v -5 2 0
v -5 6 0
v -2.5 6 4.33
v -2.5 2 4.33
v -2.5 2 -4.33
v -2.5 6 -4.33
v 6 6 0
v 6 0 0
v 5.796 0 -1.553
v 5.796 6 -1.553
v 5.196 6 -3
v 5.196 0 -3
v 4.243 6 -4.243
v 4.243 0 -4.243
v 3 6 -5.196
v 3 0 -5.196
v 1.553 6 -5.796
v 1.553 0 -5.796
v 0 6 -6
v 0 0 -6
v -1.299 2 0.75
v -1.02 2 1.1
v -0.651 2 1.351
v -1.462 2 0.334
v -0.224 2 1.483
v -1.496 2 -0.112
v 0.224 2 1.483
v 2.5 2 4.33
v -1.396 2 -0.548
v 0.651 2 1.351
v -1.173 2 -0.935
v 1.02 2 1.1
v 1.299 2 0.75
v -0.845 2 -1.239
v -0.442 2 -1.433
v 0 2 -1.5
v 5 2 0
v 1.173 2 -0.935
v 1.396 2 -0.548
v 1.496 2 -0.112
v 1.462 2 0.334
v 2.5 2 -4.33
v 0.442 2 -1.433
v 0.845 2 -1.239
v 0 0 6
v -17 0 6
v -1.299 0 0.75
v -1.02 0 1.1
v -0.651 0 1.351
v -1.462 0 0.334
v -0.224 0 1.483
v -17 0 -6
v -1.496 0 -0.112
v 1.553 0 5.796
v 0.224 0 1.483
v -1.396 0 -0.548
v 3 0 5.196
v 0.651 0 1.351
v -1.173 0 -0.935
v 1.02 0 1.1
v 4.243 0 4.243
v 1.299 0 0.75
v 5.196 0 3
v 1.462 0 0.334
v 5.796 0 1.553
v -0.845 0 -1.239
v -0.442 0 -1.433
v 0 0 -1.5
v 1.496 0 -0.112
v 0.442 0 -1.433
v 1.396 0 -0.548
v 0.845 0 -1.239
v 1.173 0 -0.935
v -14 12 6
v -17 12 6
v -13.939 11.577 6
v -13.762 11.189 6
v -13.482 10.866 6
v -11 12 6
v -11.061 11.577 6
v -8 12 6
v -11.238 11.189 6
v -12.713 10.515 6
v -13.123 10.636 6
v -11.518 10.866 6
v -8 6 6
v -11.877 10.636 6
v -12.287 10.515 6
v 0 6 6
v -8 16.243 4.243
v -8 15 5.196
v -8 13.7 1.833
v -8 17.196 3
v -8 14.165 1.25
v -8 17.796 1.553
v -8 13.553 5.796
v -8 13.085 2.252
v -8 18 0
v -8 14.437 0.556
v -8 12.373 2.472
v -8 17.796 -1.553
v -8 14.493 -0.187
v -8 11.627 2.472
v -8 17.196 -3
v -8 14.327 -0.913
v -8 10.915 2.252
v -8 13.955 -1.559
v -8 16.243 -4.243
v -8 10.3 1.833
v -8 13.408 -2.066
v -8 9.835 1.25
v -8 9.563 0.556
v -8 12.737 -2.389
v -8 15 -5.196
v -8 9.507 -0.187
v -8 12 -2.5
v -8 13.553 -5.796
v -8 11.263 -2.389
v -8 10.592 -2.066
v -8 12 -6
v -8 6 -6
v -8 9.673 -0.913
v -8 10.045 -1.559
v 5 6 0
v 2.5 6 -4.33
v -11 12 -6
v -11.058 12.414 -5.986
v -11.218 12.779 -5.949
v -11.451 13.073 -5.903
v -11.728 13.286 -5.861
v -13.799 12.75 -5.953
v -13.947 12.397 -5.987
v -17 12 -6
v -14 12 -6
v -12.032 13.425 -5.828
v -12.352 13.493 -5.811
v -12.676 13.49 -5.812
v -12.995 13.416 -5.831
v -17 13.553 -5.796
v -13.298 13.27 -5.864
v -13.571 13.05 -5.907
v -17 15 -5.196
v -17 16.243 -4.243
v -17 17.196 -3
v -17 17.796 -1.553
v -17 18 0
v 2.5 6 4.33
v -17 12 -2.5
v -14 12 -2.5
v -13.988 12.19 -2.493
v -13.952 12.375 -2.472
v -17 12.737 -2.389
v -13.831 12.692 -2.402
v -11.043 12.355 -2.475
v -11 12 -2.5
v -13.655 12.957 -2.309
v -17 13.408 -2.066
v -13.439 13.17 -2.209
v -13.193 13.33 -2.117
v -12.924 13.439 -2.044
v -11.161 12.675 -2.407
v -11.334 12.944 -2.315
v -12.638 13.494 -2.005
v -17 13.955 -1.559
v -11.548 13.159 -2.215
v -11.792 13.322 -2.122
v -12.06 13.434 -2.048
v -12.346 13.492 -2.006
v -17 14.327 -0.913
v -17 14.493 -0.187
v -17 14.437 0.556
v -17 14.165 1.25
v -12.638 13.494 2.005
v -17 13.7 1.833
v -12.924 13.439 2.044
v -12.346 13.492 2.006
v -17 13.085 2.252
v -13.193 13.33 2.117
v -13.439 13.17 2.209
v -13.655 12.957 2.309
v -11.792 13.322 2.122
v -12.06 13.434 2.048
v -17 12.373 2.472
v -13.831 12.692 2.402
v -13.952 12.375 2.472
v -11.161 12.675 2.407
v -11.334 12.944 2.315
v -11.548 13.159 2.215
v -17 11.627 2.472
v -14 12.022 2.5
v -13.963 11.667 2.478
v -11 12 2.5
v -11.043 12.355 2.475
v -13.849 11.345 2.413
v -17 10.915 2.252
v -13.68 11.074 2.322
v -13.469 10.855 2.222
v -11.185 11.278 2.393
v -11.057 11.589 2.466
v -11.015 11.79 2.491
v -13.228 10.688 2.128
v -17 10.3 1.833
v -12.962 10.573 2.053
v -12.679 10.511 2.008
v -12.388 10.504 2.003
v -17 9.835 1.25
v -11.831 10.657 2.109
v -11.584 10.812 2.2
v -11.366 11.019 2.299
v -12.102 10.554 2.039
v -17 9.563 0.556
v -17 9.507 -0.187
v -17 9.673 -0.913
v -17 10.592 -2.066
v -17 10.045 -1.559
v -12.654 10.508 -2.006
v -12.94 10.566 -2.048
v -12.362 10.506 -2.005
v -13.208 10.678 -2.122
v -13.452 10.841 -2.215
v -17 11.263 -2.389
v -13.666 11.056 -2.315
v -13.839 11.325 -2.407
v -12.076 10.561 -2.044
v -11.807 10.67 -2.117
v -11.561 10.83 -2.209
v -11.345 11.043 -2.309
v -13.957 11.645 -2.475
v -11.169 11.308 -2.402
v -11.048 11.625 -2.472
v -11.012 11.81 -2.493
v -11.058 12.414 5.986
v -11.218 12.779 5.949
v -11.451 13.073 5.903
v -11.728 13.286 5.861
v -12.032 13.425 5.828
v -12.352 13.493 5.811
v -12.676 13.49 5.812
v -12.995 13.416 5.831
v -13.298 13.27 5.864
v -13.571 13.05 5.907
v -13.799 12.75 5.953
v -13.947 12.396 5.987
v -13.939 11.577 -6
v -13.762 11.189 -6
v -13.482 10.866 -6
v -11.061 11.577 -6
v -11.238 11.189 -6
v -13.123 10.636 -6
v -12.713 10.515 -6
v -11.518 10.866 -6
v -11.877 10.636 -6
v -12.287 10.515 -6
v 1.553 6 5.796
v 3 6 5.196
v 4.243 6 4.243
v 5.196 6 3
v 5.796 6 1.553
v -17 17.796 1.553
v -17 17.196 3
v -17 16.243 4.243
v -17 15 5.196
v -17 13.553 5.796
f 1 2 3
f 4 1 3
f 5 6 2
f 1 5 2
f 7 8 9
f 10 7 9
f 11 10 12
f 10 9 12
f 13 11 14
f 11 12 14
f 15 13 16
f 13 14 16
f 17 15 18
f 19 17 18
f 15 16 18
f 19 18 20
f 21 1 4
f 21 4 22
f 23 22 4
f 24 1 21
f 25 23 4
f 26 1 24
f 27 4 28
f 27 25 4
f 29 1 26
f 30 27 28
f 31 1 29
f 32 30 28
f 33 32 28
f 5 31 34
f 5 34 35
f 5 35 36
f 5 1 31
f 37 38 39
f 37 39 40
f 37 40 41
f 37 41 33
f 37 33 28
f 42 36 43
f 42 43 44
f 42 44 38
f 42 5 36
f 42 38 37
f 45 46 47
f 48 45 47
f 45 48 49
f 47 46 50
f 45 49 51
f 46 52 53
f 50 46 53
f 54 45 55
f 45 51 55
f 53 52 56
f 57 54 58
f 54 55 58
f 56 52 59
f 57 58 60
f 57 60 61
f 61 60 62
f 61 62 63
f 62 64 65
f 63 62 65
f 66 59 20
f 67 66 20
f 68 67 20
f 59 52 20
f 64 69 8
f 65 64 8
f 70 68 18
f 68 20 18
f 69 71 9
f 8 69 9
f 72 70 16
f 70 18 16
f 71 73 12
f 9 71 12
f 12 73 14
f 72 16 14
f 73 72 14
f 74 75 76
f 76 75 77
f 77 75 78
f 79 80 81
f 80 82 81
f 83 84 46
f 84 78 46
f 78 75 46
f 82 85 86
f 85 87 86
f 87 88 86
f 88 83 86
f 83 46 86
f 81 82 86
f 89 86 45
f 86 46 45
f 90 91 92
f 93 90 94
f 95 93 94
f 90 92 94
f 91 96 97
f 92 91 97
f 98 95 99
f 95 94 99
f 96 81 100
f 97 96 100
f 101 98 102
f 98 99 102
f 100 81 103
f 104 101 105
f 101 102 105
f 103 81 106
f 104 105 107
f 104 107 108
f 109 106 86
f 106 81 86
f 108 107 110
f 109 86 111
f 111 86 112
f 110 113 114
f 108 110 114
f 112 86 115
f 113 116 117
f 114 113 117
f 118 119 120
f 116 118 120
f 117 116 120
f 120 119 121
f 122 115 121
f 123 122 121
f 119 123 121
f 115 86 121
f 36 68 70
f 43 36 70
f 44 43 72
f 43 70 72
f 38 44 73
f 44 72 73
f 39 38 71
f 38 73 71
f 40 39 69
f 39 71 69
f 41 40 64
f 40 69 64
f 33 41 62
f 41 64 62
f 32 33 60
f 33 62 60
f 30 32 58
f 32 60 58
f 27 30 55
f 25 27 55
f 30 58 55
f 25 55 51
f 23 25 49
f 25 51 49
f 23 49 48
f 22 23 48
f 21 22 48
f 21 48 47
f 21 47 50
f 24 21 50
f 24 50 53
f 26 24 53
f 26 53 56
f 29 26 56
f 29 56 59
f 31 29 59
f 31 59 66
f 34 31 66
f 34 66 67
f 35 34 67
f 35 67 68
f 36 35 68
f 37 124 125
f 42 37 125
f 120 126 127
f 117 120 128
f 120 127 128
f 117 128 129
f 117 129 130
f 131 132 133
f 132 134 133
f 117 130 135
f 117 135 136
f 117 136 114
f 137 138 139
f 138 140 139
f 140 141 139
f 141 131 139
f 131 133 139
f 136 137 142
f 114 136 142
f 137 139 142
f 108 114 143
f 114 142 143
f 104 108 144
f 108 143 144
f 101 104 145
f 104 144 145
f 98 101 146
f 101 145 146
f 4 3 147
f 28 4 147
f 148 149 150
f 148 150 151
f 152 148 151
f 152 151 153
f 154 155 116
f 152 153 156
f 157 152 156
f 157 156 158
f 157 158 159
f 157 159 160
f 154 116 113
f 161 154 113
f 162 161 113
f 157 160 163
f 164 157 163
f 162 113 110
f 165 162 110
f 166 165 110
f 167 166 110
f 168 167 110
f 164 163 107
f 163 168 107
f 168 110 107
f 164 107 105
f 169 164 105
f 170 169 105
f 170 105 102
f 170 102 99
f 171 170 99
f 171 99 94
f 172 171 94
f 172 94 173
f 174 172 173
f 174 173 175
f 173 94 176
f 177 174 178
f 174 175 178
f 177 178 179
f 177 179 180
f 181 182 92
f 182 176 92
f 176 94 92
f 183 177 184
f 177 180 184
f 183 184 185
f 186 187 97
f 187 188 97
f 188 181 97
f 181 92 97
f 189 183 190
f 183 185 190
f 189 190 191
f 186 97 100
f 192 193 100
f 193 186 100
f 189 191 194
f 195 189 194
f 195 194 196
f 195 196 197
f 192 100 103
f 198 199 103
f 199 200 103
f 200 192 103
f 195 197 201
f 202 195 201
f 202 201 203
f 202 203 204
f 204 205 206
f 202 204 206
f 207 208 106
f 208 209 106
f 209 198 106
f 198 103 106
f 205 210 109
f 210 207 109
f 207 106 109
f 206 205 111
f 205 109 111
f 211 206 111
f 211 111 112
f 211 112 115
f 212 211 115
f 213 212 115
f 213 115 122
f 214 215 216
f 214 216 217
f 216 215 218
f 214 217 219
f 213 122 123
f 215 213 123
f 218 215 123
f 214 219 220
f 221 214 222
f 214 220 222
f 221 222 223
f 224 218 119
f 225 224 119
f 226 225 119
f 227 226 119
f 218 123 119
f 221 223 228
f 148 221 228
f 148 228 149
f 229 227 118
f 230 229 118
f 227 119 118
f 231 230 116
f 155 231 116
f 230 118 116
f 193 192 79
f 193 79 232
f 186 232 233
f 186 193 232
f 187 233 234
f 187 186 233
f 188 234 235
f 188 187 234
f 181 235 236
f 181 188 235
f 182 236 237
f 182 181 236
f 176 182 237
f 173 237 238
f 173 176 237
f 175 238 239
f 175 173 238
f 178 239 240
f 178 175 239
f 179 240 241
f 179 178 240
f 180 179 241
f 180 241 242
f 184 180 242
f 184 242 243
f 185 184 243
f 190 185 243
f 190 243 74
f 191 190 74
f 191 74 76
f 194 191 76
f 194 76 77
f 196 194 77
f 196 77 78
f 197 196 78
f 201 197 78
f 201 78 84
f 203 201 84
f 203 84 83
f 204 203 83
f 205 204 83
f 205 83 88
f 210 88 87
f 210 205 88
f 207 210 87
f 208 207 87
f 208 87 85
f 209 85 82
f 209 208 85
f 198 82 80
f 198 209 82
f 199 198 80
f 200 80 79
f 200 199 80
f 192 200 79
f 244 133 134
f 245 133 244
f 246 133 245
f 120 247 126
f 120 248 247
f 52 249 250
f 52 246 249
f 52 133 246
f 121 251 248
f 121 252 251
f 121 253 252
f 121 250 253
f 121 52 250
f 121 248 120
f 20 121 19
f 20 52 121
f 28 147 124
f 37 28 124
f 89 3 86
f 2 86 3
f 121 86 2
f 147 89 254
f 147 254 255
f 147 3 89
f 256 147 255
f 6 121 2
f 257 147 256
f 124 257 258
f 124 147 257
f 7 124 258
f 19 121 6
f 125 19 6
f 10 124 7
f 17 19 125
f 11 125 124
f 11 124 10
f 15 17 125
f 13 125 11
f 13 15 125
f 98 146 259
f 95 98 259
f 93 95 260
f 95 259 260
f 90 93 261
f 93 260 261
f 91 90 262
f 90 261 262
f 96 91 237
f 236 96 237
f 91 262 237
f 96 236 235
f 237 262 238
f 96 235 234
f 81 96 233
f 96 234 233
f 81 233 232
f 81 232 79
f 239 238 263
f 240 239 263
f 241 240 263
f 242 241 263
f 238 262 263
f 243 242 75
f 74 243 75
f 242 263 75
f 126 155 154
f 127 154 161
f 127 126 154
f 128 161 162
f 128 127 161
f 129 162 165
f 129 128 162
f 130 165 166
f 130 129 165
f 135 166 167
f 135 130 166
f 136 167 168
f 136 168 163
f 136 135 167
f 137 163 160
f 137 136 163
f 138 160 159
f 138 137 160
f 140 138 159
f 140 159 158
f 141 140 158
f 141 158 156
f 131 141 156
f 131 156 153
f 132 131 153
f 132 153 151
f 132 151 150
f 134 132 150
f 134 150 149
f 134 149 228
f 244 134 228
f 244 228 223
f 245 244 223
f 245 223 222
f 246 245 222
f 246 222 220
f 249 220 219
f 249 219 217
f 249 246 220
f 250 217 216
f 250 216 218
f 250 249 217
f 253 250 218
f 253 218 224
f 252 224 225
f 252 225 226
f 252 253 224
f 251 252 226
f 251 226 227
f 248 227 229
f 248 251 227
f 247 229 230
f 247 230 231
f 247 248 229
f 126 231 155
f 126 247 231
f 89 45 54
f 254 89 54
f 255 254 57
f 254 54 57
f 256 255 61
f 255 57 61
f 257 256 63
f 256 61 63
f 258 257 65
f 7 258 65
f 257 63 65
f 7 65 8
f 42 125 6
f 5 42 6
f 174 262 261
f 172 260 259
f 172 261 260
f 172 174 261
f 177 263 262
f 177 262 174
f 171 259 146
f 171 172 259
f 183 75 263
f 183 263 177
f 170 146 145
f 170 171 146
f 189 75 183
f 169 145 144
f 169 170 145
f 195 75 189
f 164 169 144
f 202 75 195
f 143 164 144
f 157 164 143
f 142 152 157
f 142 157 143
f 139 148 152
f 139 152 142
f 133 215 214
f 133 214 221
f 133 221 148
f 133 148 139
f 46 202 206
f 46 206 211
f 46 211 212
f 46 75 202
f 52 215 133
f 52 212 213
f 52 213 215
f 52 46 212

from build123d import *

# Parameters (mm, degrees)
EXTRUDE_1_DEPTH          = 6
CUT_EXTRUDE_1_DEPTH      = 4
SKETCH_3_R               = 1.5
CUT_EXTRUDE_2_DEPTH      = 4
SKETCH_5_W               = 9
SKETCH_5_H               = 12
EXTRUDE_2_DEPTH          = 12
CUT_EXTRUDE_3_DEPTH      = 30.816103032
SKETCH_9_R               = 2.5
CUT_EXTRUDE_6_DEPTH      = 24.579652245
CUT_EXTRUDE_7_DEPTH      = 26.475478406
CUT_EXTRUDE_7_DEPTH_BACK = 26.475478406
SKETCH_10_R              = 1.5


with BuildPart() as part:
    # 草图1 → 凸台-拉伸1 (new body)
    with BuildSketch(Plane(origin=(0, 0, 0), x_dir=(1, 0, 0), z_dir=(0, 1, 0))):
        with BuildLine():
            ThreePointArc((0, -6), (-6, 0), (0, 6))
            Line((0, 6), (-6, 6))
            Line((-6, 6), (-17, 6))
            Line((-17, 6), (-17, -6))
            Line((-17, -6), (0, -6))
        make_face()
        with BuildLine():
            Line((0, -6), (0, 0))
            Line((0, 0), (0, 6))
            ThreePointArc((0, 6), (-6, 0), (0, -6))
        make_face()
        with BuildLine():
            Line((0, 6), (0, 0))
            Line((0, 0), (0, -6))
            ThreePointArc((0, -6), (4.242640687, -4.242640687), (6, 0))
            ThreePointArc((6, 0), (4.242640687, 4.242640687), (0, 6))
        make_face()
    extrude(amount=EXTRUDE_1_DEPTH)

    # 草图2 → 切除-拉伸1 (cut)
    with BuildSketch(Plane(origin=(0, 6, 0), x_dir=(1, 0, 0), z_dir=(0, 1, 0))):
        Polygon((2.5, -4.330127019), (5, 0), (2.5, 4.330127019), (-2.5, 4.330127019), (-5, 0), (-2.5, -4.330127019), align=None)
    extrude(amount=-CUT_EXTRUDE_1_DEPTH, mode=Mode.SUBTRACT)

    # 草图3 → 切除-拉伸2 (cut)
    with BuildSketch(Plane.XZ):
        with Locations(Location((0, 0, 0), (0, 0, 270))):
            Circle(SKETCH_3_R)
    extrude(amount=-CUT_EXTRUDE_2_DEPTH, mode=Mode.SUBTRACT)

    # 草图5 → 凸台-拉伸2 (add)
    with BuildSketch(Plane(origin=(0, 6, 0), x_dir=(1, 0, 0), z_dir=(0, 1, 0))):
        with Locations((-12.5, 0)):
            Rectangle(SKETCH_5_W, SKETCH_5_H)
    extrude(amount=EXTRUDE_2_DEPTH)

    # 草图6 → 切除-拉伸3 (cut, through all)
    with BuildSketch(Plane.ZY.offset(17)):
        with BuildLine():
            Line((0, 18), (-6, 18))
            Line((-6, 18), (-6, 12))
            ThreePointArc((-6, 12), (-4.242640687, 16.242640687), (0, 18))
        make_face()
        with BuildLine():
            Line((6, 18), (0, 18))
            ThreePointArc((0, 18), (4.242640687, 16.242640687), (6, 12))
            Line((6, 12), (6, 18))
        make_face()
    extrude(amount=-CUT_EXTRUDE_3_DEPTH, mode=Mode.SUBTRACT)

    # 草图9 → 切除-拉伸6 (cut, through all)
    with BuildSketch(Plane(origin=(-8, 0, 0), x_dir=(0, 0, -1), z_dir=(1, 0, 0))):
        with Locations((0, 12)):
            Circle(SKETCH_9_R)
    extrude(amount=-CUT_EXTRUDE_6_DEPTH, mode=Mode.SUBTRACT)

    # 草图10 → 切除-拉伸7 (cut, two sides: drawn at the far end of the back side and taken through both)
    with BuildSketch(Plane.XY.offset(-CUT_EXTRUDE_7_DEPTH_BACK)):
        with Locations((-12.5, 12)):
            Circle(SKETCH_10_R)
    extrude(amount=CUT_EXTRUDE_7_DEPTH + CUT_EXTRUDE_7_DEPTH_BACK, mode=Mode.SUBTRACT)


solid = part.part
